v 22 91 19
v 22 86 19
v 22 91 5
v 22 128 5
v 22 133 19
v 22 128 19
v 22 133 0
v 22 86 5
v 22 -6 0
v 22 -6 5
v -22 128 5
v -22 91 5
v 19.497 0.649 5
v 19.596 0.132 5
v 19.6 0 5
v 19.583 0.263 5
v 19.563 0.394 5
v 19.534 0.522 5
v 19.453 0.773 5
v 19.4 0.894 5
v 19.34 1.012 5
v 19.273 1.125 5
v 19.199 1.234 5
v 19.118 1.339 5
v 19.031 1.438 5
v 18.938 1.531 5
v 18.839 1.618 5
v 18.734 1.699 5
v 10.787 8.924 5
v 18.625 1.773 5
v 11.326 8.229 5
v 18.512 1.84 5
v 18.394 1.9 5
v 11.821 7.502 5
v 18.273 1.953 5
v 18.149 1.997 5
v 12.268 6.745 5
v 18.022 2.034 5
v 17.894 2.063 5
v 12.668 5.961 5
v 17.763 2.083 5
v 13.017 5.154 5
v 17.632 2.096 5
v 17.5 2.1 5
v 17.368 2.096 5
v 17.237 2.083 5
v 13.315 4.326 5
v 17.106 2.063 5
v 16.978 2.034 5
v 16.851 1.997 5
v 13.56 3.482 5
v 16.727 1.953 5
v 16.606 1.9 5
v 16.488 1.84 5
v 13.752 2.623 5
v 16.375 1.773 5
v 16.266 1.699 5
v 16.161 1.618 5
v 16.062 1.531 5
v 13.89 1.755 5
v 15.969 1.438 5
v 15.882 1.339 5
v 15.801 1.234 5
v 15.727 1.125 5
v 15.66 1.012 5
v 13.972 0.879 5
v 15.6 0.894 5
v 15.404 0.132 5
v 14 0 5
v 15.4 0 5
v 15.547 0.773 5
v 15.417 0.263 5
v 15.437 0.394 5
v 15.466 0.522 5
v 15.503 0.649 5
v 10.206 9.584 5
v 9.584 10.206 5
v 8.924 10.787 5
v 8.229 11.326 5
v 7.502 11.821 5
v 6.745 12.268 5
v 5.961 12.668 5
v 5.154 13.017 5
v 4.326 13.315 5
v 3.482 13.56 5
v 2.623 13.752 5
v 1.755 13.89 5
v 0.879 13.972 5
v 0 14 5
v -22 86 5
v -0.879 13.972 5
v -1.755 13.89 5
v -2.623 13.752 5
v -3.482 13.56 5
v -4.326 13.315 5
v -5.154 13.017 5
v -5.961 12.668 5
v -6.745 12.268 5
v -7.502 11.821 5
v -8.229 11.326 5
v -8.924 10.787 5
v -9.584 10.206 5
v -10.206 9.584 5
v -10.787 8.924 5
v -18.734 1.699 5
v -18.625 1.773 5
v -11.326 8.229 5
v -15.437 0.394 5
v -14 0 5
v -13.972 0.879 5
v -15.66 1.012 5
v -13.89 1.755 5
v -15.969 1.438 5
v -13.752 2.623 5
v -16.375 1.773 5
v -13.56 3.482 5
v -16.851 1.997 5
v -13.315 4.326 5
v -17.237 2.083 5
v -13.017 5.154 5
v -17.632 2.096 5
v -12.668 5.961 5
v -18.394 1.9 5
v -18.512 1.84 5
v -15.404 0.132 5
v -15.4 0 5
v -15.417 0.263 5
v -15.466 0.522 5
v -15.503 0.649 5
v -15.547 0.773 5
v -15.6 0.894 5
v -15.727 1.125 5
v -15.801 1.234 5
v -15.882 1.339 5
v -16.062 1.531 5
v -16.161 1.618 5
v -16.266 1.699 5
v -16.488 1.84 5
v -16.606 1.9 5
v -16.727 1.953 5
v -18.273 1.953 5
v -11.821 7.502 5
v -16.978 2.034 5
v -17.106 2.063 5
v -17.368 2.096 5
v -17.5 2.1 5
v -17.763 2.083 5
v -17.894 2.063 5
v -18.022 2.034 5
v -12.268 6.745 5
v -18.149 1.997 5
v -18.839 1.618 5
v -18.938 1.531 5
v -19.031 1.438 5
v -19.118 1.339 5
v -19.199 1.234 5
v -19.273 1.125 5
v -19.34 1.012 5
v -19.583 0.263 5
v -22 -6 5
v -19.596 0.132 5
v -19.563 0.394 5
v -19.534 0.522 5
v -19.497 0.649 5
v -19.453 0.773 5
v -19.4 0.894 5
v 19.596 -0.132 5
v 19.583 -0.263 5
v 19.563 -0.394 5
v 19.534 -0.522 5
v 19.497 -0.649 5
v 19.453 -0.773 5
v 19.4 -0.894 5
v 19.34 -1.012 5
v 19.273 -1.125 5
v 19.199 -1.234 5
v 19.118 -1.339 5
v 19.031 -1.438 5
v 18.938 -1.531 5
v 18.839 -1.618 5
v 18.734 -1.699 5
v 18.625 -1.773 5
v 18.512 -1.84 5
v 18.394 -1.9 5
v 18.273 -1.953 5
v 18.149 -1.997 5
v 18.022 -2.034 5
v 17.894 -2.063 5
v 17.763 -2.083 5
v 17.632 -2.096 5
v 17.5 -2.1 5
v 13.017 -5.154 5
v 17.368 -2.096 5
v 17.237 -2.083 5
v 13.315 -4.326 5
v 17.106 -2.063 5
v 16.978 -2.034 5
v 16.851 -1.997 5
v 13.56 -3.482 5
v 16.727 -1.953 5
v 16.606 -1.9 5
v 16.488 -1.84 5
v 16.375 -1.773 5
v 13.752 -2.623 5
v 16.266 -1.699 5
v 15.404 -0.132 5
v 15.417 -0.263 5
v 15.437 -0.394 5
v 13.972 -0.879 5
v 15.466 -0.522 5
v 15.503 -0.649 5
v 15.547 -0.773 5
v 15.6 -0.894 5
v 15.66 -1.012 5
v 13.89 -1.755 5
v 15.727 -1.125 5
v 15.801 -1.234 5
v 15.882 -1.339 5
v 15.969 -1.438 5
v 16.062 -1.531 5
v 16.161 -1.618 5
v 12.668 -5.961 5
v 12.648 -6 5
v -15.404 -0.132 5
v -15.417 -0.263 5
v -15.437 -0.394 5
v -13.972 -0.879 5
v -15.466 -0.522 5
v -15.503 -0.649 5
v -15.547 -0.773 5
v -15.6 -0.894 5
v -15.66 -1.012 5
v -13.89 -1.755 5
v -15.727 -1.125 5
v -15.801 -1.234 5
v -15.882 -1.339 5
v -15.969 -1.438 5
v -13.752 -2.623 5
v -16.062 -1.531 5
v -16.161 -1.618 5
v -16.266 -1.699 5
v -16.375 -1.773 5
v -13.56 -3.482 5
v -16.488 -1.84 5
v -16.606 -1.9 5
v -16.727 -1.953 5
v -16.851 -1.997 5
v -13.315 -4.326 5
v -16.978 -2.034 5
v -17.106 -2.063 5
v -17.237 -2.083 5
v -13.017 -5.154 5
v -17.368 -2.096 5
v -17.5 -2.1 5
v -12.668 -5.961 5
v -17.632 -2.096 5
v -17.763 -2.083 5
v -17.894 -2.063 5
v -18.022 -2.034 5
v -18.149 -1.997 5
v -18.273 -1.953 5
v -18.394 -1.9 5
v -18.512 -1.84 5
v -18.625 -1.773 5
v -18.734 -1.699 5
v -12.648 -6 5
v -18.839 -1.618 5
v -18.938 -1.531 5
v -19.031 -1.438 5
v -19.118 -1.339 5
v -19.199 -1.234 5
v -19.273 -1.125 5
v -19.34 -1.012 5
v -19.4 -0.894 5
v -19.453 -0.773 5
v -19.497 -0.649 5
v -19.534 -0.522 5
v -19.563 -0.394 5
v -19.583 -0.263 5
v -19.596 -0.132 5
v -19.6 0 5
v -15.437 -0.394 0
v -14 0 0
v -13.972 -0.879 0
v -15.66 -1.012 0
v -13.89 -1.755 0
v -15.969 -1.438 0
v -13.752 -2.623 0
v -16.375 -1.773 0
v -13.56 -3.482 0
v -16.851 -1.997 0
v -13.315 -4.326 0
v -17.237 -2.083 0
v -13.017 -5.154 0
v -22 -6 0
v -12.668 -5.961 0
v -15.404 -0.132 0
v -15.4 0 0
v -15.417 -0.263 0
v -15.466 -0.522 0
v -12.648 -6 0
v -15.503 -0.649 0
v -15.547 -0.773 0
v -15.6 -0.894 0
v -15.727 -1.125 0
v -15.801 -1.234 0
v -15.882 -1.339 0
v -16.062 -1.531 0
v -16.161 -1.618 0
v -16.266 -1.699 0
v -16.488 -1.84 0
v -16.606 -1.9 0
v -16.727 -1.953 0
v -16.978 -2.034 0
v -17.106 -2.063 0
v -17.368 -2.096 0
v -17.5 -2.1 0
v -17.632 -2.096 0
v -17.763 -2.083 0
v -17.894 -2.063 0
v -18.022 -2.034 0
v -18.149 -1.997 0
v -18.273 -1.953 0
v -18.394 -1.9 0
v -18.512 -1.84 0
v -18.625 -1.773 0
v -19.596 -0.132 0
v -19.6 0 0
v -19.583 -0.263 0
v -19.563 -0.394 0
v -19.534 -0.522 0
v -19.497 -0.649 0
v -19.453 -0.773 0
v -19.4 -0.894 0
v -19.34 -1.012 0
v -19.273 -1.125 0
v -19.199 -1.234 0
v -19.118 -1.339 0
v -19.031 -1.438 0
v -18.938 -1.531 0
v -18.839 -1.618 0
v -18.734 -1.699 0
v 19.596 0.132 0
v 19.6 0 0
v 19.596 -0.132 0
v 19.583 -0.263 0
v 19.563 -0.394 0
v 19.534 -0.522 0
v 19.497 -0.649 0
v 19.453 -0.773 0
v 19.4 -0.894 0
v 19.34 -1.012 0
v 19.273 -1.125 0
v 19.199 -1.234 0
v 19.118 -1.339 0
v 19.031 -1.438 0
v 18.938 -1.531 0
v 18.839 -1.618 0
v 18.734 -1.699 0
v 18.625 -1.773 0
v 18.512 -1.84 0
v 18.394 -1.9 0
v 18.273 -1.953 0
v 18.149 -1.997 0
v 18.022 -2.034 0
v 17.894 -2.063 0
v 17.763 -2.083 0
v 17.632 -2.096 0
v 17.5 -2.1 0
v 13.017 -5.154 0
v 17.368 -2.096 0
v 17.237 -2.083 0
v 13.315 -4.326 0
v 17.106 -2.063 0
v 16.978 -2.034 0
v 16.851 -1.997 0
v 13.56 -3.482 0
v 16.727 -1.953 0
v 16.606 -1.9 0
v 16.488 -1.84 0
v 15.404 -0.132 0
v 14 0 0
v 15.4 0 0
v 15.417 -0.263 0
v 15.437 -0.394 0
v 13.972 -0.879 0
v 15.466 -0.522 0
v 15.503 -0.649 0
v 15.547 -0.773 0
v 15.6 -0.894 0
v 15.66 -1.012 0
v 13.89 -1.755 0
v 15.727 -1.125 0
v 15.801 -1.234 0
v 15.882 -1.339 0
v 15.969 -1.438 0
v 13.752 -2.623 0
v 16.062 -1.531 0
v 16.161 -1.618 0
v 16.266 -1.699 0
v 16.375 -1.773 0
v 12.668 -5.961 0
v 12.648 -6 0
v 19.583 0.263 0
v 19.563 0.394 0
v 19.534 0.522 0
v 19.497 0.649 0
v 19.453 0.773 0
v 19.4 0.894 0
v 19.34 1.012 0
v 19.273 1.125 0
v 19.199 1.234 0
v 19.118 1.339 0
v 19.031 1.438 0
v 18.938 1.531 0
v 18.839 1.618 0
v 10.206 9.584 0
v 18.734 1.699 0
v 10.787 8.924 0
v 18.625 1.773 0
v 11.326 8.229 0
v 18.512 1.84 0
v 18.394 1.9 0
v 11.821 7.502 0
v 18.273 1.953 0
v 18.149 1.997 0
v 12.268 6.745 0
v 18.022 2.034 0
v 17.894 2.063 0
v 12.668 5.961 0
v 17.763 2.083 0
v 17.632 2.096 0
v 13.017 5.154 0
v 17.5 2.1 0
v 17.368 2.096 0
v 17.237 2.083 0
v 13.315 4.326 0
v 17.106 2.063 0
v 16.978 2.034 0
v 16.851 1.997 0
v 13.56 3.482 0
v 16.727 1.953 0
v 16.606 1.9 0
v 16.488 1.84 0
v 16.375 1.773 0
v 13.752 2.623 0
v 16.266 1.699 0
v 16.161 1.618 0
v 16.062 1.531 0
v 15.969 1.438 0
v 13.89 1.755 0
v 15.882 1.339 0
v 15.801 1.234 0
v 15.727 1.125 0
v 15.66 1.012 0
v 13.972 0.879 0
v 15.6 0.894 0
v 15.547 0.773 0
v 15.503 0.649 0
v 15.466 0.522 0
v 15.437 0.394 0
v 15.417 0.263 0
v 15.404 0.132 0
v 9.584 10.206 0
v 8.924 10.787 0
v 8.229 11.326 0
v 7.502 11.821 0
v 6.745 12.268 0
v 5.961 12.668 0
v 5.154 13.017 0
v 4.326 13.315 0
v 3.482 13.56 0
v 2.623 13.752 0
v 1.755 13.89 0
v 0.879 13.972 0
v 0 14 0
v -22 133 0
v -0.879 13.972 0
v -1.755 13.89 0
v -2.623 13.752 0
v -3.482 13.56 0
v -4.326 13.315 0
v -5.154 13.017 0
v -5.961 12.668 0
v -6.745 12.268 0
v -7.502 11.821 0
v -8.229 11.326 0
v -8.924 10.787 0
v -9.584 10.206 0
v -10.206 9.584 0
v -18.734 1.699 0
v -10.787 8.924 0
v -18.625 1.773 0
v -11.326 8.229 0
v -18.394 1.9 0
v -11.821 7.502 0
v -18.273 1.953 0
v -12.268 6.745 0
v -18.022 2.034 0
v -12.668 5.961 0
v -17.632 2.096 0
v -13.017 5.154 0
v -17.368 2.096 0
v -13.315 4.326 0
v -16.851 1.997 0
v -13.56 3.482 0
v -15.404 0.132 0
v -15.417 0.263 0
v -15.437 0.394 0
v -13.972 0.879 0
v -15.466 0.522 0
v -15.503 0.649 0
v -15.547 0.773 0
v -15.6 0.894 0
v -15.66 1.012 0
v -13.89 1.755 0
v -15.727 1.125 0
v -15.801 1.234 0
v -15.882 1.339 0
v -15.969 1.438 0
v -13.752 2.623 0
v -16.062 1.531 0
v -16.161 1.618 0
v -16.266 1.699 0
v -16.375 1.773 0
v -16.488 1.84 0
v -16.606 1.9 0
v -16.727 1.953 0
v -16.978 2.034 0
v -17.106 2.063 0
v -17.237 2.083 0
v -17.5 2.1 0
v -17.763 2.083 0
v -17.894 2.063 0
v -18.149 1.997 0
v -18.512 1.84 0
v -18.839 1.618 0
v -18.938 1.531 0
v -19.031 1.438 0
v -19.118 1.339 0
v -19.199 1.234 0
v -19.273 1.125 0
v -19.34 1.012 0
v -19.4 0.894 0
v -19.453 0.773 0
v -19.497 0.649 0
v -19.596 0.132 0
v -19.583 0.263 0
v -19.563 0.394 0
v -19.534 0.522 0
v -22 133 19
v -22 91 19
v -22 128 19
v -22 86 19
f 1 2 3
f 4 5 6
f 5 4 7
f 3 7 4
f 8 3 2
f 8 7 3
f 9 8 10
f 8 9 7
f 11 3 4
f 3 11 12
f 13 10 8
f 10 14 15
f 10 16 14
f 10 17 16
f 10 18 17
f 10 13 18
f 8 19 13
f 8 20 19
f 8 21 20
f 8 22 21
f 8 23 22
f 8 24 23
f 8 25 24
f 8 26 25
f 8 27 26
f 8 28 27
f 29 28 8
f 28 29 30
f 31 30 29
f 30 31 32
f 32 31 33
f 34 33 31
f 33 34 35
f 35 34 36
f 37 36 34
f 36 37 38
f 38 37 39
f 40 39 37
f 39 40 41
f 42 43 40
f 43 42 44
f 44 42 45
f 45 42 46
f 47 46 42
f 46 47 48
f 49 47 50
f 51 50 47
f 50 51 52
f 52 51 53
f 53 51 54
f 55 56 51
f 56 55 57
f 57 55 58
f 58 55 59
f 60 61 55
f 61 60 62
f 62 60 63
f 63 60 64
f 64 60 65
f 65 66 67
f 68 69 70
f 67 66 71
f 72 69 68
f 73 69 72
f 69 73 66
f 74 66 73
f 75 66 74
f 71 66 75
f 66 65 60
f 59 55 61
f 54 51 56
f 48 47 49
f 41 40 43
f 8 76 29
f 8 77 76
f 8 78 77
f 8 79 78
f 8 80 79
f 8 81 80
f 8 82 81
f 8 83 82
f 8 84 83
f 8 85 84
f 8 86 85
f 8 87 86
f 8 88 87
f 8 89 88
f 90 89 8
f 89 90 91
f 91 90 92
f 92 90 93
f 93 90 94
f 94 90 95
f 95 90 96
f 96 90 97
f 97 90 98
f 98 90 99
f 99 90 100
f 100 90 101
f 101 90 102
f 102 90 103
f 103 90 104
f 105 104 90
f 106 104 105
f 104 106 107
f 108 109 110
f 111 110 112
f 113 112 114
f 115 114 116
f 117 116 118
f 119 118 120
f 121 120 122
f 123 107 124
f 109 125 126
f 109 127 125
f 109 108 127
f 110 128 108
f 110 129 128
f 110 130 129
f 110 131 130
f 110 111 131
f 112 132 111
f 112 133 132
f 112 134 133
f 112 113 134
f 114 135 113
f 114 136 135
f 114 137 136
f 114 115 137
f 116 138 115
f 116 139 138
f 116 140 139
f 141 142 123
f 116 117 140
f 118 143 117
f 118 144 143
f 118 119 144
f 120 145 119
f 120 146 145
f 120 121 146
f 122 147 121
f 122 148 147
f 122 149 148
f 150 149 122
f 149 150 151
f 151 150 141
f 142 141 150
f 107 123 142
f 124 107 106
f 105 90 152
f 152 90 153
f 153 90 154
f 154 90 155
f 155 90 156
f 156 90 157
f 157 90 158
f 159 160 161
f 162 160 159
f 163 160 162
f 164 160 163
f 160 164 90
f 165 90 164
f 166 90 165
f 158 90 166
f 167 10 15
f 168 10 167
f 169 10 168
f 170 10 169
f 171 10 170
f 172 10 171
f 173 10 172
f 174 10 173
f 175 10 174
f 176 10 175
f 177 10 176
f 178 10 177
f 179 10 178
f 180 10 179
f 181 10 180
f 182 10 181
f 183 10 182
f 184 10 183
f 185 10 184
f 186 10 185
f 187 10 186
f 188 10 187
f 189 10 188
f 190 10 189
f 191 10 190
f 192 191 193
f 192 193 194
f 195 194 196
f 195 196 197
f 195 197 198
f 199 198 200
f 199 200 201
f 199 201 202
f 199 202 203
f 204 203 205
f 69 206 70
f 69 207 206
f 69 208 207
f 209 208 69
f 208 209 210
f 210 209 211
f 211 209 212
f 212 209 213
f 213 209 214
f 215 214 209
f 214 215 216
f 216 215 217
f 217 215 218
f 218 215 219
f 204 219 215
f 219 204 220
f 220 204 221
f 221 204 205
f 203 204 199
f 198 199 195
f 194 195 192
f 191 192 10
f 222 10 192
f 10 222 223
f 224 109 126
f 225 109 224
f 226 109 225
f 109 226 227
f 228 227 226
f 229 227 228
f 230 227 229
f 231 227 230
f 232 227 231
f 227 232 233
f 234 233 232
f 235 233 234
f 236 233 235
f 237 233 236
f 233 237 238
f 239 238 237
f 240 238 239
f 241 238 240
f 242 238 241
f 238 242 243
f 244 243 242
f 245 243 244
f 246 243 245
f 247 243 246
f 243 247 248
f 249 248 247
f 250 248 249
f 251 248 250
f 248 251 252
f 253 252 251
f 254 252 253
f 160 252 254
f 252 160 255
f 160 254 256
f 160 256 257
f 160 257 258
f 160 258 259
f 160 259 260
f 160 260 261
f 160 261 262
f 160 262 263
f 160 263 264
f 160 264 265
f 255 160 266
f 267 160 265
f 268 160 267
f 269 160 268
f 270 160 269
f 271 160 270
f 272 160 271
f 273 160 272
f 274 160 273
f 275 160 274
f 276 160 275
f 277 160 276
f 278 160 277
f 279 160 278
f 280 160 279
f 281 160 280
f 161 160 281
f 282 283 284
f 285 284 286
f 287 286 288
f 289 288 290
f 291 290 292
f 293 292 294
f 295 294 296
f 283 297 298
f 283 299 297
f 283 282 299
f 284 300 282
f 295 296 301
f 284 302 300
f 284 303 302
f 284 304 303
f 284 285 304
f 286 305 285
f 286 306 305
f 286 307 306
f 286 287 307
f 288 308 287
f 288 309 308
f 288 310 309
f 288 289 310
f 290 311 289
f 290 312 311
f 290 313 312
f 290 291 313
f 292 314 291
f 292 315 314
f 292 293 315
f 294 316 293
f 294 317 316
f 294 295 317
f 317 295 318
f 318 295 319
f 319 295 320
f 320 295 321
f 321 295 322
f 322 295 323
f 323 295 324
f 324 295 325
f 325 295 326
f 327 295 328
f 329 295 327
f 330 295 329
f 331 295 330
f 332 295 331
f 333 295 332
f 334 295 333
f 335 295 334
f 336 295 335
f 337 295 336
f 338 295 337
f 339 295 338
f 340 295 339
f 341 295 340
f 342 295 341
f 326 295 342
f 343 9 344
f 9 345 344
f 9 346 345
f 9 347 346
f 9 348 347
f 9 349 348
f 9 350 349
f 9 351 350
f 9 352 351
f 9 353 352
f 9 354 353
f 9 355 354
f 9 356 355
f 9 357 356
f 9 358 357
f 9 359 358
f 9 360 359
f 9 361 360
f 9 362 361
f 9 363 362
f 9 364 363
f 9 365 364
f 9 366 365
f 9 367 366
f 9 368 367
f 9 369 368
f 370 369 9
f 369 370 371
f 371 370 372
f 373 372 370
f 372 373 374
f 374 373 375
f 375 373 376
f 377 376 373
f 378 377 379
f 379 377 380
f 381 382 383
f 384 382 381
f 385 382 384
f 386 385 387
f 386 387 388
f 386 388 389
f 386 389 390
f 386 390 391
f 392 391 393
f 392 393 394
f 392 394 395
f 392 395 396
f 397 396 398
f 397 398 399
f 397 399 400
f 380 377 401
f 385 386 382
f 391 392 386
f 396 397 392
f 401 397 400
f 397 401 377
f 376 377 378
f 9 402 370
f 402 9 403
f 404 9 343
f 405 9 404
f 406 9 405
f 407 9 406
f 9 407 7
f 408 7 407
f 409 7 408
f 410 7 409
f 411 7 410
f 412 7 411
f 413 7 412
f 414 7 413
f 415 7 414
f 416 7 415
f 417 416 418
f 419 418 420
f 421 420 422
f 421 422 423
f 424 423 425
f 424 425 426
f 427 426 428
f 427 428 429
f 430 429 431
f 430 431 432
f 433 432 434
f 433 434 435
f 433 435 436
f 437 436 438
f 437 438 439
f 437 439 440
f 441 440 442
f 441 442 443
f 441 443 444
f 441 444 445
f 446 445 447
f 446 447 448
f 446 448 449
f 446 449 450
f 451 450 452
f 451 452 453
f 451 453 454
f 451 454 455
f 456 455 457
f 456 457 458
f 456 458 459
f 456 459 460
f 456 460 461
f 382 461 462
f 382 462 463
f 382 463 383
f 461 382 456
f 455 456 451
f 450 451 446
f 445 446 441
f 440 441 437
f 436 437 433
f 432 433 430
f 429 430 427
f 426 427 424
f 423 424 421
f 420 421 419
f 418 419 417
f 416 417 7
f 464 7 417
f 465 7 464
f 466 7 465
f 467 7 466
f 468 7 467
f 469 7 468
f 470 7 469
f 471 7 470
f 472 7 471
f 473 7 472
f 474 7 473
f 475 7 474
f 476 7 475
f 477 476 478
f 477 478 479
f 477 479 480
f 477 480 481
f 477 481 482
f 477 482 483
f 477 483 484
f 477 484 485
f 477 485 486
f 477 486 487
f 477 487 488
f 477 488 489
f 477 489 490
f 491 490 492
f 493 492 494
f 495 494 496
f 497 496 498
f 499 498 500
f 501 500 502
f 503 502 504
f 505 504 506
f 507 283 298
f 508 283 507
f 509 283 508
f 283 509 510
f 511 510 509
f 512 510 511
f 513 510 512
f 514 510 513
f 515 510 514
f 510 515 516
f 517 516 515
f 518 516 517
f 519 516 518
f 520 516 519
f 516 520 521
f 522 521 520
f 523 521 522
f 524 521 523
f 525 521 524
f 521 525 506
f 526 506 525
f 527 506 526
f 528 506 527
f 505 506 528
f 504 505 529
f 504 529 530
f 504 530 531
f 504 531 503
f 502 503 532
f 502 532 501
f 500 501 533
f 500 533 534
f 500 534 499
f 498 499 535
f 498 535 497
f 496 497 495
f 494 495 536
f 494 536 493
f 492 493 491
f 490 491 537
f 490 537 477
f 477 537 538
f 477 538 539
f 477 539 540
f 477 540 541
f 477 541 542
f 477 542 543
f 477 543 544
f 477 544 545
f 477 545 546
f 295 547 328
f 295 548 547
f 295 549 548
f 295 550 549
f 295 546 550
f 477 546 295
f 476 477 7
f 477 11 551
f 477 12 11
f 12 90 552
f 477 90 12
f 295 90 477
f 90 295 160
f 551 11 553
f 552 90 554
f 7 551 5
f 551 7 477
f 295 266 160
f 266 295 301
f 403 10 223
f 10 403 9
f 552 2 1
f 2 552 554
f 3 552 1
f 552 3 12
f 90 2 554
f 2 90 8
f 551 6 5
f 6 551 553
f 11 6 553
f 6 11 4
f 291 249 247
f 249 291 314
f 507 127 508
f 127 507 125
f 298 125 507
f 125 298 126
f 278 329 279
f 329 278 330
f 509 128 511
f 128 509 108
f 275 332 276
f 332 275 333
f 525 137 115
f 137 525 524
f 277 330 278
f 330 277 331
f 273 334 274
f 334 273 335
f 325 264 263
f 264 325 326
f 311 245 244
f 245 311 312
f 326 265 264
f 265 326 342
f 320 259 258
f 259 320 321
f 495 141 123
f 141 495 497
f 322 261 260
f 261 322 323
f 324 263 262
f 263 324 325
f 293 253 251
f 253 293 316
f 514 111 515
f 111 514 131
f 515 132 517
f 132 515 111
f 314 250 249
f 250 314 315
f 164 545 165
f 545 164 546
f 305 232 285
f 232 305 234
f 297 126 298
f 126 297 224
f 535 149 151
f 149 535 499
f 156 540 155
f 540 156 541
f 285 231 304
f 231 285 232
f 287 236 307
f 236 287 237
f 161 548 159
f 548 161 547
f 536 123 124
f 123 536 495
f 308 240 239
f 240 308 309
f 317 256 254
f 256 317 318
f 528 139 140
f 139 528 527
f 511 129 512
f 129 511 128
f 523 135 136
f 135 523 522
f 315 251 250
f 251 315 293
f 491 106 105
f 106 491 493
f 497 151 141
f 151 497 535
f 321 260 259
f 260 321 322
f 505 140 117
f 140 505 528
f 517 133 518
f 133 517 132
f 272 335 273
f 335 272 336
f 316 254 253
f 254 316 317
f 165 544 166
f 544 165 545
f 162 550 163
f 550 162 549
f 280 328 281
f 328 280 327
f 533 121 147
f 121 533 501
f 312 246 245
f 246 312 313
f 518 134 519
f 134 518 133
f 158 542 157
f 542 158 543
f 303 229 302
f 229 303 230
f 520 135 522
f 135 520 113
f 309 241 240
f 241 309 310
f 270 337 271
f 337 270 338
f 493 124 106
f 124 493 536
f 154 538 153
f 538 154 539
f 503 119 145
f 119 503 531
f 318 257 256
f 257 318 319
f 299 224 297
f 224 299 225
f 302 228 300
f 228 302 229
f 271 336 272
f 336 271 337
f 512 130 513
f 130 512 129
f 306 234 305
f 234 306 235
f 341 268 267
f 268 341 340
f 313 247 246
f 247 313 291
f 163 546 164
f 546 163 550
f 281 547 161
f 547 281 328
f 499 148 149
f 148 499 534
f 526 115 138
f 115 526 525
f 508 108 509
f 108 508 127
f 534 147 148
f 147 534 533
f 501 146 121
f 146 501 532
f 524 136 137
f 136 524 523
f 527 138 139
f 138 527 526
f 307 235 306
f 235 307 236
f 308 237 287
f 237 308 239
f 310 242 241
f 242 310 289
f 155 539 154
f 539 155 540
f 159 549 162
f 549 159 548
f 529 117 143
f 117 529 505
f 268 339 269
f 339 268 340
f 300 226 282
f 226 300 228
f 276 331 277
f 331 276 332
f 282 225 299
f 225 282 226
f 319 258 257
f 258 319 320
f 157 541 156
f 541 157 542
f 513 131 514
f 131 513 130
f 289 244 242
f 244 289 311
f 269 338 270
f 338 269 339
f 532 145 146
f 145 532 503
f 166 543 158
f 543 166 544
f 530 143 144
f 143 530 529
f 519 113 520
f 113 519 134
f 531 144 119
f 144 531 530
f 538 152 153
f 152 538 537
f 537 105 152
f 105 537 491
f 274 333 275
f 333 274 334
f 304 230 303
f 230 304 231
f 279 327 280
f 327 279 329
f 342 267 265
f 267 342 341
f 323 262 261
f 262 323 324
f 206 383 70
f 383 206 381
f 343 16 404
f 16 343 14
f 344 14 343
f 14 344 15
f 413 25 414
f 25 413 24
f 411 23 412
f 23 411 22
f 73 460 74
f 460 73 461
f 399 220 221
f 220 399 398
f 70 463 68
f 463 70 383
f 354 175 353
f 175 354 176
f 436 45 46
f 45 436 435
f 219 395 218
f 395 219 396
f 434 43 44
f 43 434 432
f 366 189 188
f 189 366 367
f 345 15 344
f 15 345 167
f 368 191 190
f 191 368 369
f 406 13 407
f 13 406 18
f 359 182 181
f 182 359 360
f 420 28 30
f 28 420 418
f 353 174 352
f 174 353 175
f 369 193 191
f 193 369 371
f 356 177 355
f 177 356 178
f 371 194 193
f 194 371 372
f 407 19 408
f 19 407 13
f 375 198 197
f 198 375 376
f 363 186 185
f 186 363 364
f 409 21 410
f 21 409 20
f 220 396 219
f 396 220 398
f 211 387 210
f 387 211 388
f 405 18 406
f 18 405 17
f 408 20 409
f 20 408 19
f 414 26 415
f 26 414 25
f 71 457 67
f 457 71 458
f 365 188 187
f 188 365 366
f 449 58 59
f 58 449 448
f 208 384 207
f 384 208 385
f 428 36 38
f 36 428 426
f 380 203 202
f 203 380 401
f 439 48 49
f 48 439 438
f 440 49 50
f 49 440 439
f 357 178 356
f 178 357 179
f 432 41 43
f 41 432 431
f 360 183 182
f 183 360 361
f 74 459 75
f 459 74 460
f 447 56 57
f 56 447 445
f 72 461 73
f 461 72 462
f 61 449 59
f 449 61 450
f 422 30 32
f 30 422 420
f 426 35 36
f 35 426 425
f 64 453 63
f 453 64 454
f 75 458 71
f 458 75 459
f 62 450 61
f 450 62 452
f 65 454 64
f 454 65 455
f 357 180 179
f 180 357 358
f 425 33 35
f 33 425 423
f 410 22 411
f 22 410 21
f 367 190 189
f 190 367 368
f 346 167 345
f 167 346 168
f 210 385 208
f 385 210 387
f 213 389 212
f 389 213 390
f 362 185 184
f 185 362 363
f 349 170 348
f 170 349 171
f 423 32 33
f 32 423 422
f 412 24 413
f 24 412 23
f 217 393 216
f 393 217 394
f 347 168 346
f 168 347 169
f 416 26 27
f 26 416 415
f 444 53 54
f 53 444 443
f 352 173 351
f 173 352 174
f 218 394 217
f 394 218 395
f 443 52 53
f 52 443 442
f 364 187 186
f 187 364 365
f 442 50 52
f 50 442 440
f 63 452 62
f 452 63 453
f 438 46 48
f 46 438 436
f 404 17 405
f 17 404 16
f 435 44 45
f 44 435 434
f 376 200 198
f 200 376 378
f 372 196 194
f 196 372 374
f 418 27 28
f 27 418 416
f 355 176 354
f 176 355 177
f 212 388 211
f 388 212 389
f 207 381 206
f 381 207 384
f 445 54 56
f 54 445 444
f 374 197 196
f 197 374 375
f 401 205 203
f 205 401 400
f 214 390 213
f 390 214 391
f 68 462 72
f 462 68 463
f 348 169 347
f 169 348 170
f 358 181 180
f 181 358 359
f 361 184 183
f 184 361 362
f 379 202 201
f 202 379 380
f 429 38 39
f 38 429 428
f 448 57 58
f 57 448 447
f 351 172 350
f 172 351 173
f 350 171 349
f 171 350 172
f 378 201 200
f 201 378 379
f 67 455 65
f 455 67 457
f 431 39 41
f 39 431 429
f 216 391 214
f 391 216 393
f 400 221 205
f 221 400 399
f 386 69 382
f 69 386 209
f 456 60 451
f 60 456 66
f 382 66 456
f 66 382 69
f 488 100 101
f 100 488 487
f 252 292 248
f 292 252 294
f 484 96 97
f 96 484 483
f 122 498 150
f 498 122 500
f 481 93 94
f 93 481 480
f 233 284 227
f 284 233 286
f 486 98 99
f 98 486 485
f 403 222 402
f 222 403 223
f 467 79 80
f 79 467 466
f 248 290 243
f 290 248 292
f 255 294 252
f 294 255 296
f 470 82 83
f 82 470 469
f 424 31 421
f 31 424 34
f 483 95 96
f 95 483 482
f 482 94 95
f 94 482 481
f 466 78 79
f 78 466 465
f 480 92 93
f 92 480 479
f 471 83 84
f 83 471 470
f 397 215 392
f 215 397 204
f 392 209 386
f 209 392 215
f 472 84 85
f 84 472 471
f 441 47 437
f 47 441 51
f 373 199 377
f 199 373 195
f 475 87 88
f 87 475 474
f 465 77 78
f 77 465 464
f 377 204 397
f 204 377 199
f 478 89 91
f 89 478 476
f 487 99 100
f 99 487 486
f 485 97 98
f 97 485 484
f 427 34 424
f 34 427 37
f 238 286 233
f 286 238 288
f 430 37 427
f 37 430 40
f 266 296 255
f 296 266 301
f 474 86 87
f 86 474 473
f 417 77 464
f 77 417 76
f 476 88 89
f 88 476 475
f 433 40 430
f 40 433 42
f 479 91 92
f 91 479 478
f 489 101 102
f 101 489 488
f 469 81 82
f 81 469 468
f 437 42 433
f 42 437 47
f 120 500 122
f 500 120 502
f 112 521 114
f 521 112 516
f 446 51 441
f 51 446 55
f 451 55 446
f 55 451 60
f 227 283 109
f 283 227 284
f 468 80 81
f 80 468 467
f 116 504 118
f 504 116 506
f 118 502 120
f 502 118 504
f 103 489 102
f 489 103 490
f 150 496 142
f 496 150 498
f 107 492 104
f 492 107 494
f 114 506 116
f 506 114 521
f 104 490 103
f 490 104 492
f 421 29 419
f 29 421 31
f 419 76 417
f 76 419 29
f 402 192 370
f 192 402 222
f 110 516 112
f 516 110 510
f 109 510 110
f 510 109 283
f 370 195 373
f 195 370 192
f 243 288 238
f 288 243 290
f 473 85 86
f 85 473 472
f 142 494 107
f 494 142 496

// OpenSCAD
// shaft dia = 5
// flat bit = 3
// length = 8.5
// flat length = 6
tolerance = 2;
dial_height = 37;
hearth_thickness = 37;
hearth_offset_origin = 97; //102.5 - dial_height / 2;
housing_diameter = 28;
support_breadth =  44;
support_height = 5;
hole_offset = 17.5;
hole_tolerance = 0.15;
hole_diameter = 4.2;
interface_thickness = 4;
protrusion = interface_thickness + 10;
protrusion_thickness = 5;
support_offset = 6;
support_width = hearth_offset_origin + hearth_thickness + protrusion_thickness;// + support_offset;





difference(){
    union() {
        translate([-support_breadth / 2, -support_offset, 0 ])
        cube(size = [support_breadth, support_width, support_height], center = false);
        translate([-support_breadth / 2, hearth_offset_origin - protrusion_thickness - support_offset, support_height ])
        cube(size = [support_breadth, protrusion_thickness, protrusion], center = false);
        translate([-support_breadth / 2, hearth_offset_origin - support_offset + hearth_thickness, support_height ])
        cube(size = [support_breadth, protrusion_thickness, protrusion], center = false);
    }

    // Holes
    translate([-hole_offset, 0, -0.1])
    cylinder(h=support_height + tolerance, d1=hole_diameter, d2=hole_diameter, center=false, $fn=100);
    translate([hole_offset, 0, -0.1])
    cylinder(h=support_height + tolerance, d1=hole_diameter, d2=hole_diameter, center=false, $fn=100);

    // Motor housing
    translate([0, 0, -0.1])
    cylinder(h=support_height + tolerance, d1=housing_diameter, d2=housing_diameter, center=false, $fn=100);
}
